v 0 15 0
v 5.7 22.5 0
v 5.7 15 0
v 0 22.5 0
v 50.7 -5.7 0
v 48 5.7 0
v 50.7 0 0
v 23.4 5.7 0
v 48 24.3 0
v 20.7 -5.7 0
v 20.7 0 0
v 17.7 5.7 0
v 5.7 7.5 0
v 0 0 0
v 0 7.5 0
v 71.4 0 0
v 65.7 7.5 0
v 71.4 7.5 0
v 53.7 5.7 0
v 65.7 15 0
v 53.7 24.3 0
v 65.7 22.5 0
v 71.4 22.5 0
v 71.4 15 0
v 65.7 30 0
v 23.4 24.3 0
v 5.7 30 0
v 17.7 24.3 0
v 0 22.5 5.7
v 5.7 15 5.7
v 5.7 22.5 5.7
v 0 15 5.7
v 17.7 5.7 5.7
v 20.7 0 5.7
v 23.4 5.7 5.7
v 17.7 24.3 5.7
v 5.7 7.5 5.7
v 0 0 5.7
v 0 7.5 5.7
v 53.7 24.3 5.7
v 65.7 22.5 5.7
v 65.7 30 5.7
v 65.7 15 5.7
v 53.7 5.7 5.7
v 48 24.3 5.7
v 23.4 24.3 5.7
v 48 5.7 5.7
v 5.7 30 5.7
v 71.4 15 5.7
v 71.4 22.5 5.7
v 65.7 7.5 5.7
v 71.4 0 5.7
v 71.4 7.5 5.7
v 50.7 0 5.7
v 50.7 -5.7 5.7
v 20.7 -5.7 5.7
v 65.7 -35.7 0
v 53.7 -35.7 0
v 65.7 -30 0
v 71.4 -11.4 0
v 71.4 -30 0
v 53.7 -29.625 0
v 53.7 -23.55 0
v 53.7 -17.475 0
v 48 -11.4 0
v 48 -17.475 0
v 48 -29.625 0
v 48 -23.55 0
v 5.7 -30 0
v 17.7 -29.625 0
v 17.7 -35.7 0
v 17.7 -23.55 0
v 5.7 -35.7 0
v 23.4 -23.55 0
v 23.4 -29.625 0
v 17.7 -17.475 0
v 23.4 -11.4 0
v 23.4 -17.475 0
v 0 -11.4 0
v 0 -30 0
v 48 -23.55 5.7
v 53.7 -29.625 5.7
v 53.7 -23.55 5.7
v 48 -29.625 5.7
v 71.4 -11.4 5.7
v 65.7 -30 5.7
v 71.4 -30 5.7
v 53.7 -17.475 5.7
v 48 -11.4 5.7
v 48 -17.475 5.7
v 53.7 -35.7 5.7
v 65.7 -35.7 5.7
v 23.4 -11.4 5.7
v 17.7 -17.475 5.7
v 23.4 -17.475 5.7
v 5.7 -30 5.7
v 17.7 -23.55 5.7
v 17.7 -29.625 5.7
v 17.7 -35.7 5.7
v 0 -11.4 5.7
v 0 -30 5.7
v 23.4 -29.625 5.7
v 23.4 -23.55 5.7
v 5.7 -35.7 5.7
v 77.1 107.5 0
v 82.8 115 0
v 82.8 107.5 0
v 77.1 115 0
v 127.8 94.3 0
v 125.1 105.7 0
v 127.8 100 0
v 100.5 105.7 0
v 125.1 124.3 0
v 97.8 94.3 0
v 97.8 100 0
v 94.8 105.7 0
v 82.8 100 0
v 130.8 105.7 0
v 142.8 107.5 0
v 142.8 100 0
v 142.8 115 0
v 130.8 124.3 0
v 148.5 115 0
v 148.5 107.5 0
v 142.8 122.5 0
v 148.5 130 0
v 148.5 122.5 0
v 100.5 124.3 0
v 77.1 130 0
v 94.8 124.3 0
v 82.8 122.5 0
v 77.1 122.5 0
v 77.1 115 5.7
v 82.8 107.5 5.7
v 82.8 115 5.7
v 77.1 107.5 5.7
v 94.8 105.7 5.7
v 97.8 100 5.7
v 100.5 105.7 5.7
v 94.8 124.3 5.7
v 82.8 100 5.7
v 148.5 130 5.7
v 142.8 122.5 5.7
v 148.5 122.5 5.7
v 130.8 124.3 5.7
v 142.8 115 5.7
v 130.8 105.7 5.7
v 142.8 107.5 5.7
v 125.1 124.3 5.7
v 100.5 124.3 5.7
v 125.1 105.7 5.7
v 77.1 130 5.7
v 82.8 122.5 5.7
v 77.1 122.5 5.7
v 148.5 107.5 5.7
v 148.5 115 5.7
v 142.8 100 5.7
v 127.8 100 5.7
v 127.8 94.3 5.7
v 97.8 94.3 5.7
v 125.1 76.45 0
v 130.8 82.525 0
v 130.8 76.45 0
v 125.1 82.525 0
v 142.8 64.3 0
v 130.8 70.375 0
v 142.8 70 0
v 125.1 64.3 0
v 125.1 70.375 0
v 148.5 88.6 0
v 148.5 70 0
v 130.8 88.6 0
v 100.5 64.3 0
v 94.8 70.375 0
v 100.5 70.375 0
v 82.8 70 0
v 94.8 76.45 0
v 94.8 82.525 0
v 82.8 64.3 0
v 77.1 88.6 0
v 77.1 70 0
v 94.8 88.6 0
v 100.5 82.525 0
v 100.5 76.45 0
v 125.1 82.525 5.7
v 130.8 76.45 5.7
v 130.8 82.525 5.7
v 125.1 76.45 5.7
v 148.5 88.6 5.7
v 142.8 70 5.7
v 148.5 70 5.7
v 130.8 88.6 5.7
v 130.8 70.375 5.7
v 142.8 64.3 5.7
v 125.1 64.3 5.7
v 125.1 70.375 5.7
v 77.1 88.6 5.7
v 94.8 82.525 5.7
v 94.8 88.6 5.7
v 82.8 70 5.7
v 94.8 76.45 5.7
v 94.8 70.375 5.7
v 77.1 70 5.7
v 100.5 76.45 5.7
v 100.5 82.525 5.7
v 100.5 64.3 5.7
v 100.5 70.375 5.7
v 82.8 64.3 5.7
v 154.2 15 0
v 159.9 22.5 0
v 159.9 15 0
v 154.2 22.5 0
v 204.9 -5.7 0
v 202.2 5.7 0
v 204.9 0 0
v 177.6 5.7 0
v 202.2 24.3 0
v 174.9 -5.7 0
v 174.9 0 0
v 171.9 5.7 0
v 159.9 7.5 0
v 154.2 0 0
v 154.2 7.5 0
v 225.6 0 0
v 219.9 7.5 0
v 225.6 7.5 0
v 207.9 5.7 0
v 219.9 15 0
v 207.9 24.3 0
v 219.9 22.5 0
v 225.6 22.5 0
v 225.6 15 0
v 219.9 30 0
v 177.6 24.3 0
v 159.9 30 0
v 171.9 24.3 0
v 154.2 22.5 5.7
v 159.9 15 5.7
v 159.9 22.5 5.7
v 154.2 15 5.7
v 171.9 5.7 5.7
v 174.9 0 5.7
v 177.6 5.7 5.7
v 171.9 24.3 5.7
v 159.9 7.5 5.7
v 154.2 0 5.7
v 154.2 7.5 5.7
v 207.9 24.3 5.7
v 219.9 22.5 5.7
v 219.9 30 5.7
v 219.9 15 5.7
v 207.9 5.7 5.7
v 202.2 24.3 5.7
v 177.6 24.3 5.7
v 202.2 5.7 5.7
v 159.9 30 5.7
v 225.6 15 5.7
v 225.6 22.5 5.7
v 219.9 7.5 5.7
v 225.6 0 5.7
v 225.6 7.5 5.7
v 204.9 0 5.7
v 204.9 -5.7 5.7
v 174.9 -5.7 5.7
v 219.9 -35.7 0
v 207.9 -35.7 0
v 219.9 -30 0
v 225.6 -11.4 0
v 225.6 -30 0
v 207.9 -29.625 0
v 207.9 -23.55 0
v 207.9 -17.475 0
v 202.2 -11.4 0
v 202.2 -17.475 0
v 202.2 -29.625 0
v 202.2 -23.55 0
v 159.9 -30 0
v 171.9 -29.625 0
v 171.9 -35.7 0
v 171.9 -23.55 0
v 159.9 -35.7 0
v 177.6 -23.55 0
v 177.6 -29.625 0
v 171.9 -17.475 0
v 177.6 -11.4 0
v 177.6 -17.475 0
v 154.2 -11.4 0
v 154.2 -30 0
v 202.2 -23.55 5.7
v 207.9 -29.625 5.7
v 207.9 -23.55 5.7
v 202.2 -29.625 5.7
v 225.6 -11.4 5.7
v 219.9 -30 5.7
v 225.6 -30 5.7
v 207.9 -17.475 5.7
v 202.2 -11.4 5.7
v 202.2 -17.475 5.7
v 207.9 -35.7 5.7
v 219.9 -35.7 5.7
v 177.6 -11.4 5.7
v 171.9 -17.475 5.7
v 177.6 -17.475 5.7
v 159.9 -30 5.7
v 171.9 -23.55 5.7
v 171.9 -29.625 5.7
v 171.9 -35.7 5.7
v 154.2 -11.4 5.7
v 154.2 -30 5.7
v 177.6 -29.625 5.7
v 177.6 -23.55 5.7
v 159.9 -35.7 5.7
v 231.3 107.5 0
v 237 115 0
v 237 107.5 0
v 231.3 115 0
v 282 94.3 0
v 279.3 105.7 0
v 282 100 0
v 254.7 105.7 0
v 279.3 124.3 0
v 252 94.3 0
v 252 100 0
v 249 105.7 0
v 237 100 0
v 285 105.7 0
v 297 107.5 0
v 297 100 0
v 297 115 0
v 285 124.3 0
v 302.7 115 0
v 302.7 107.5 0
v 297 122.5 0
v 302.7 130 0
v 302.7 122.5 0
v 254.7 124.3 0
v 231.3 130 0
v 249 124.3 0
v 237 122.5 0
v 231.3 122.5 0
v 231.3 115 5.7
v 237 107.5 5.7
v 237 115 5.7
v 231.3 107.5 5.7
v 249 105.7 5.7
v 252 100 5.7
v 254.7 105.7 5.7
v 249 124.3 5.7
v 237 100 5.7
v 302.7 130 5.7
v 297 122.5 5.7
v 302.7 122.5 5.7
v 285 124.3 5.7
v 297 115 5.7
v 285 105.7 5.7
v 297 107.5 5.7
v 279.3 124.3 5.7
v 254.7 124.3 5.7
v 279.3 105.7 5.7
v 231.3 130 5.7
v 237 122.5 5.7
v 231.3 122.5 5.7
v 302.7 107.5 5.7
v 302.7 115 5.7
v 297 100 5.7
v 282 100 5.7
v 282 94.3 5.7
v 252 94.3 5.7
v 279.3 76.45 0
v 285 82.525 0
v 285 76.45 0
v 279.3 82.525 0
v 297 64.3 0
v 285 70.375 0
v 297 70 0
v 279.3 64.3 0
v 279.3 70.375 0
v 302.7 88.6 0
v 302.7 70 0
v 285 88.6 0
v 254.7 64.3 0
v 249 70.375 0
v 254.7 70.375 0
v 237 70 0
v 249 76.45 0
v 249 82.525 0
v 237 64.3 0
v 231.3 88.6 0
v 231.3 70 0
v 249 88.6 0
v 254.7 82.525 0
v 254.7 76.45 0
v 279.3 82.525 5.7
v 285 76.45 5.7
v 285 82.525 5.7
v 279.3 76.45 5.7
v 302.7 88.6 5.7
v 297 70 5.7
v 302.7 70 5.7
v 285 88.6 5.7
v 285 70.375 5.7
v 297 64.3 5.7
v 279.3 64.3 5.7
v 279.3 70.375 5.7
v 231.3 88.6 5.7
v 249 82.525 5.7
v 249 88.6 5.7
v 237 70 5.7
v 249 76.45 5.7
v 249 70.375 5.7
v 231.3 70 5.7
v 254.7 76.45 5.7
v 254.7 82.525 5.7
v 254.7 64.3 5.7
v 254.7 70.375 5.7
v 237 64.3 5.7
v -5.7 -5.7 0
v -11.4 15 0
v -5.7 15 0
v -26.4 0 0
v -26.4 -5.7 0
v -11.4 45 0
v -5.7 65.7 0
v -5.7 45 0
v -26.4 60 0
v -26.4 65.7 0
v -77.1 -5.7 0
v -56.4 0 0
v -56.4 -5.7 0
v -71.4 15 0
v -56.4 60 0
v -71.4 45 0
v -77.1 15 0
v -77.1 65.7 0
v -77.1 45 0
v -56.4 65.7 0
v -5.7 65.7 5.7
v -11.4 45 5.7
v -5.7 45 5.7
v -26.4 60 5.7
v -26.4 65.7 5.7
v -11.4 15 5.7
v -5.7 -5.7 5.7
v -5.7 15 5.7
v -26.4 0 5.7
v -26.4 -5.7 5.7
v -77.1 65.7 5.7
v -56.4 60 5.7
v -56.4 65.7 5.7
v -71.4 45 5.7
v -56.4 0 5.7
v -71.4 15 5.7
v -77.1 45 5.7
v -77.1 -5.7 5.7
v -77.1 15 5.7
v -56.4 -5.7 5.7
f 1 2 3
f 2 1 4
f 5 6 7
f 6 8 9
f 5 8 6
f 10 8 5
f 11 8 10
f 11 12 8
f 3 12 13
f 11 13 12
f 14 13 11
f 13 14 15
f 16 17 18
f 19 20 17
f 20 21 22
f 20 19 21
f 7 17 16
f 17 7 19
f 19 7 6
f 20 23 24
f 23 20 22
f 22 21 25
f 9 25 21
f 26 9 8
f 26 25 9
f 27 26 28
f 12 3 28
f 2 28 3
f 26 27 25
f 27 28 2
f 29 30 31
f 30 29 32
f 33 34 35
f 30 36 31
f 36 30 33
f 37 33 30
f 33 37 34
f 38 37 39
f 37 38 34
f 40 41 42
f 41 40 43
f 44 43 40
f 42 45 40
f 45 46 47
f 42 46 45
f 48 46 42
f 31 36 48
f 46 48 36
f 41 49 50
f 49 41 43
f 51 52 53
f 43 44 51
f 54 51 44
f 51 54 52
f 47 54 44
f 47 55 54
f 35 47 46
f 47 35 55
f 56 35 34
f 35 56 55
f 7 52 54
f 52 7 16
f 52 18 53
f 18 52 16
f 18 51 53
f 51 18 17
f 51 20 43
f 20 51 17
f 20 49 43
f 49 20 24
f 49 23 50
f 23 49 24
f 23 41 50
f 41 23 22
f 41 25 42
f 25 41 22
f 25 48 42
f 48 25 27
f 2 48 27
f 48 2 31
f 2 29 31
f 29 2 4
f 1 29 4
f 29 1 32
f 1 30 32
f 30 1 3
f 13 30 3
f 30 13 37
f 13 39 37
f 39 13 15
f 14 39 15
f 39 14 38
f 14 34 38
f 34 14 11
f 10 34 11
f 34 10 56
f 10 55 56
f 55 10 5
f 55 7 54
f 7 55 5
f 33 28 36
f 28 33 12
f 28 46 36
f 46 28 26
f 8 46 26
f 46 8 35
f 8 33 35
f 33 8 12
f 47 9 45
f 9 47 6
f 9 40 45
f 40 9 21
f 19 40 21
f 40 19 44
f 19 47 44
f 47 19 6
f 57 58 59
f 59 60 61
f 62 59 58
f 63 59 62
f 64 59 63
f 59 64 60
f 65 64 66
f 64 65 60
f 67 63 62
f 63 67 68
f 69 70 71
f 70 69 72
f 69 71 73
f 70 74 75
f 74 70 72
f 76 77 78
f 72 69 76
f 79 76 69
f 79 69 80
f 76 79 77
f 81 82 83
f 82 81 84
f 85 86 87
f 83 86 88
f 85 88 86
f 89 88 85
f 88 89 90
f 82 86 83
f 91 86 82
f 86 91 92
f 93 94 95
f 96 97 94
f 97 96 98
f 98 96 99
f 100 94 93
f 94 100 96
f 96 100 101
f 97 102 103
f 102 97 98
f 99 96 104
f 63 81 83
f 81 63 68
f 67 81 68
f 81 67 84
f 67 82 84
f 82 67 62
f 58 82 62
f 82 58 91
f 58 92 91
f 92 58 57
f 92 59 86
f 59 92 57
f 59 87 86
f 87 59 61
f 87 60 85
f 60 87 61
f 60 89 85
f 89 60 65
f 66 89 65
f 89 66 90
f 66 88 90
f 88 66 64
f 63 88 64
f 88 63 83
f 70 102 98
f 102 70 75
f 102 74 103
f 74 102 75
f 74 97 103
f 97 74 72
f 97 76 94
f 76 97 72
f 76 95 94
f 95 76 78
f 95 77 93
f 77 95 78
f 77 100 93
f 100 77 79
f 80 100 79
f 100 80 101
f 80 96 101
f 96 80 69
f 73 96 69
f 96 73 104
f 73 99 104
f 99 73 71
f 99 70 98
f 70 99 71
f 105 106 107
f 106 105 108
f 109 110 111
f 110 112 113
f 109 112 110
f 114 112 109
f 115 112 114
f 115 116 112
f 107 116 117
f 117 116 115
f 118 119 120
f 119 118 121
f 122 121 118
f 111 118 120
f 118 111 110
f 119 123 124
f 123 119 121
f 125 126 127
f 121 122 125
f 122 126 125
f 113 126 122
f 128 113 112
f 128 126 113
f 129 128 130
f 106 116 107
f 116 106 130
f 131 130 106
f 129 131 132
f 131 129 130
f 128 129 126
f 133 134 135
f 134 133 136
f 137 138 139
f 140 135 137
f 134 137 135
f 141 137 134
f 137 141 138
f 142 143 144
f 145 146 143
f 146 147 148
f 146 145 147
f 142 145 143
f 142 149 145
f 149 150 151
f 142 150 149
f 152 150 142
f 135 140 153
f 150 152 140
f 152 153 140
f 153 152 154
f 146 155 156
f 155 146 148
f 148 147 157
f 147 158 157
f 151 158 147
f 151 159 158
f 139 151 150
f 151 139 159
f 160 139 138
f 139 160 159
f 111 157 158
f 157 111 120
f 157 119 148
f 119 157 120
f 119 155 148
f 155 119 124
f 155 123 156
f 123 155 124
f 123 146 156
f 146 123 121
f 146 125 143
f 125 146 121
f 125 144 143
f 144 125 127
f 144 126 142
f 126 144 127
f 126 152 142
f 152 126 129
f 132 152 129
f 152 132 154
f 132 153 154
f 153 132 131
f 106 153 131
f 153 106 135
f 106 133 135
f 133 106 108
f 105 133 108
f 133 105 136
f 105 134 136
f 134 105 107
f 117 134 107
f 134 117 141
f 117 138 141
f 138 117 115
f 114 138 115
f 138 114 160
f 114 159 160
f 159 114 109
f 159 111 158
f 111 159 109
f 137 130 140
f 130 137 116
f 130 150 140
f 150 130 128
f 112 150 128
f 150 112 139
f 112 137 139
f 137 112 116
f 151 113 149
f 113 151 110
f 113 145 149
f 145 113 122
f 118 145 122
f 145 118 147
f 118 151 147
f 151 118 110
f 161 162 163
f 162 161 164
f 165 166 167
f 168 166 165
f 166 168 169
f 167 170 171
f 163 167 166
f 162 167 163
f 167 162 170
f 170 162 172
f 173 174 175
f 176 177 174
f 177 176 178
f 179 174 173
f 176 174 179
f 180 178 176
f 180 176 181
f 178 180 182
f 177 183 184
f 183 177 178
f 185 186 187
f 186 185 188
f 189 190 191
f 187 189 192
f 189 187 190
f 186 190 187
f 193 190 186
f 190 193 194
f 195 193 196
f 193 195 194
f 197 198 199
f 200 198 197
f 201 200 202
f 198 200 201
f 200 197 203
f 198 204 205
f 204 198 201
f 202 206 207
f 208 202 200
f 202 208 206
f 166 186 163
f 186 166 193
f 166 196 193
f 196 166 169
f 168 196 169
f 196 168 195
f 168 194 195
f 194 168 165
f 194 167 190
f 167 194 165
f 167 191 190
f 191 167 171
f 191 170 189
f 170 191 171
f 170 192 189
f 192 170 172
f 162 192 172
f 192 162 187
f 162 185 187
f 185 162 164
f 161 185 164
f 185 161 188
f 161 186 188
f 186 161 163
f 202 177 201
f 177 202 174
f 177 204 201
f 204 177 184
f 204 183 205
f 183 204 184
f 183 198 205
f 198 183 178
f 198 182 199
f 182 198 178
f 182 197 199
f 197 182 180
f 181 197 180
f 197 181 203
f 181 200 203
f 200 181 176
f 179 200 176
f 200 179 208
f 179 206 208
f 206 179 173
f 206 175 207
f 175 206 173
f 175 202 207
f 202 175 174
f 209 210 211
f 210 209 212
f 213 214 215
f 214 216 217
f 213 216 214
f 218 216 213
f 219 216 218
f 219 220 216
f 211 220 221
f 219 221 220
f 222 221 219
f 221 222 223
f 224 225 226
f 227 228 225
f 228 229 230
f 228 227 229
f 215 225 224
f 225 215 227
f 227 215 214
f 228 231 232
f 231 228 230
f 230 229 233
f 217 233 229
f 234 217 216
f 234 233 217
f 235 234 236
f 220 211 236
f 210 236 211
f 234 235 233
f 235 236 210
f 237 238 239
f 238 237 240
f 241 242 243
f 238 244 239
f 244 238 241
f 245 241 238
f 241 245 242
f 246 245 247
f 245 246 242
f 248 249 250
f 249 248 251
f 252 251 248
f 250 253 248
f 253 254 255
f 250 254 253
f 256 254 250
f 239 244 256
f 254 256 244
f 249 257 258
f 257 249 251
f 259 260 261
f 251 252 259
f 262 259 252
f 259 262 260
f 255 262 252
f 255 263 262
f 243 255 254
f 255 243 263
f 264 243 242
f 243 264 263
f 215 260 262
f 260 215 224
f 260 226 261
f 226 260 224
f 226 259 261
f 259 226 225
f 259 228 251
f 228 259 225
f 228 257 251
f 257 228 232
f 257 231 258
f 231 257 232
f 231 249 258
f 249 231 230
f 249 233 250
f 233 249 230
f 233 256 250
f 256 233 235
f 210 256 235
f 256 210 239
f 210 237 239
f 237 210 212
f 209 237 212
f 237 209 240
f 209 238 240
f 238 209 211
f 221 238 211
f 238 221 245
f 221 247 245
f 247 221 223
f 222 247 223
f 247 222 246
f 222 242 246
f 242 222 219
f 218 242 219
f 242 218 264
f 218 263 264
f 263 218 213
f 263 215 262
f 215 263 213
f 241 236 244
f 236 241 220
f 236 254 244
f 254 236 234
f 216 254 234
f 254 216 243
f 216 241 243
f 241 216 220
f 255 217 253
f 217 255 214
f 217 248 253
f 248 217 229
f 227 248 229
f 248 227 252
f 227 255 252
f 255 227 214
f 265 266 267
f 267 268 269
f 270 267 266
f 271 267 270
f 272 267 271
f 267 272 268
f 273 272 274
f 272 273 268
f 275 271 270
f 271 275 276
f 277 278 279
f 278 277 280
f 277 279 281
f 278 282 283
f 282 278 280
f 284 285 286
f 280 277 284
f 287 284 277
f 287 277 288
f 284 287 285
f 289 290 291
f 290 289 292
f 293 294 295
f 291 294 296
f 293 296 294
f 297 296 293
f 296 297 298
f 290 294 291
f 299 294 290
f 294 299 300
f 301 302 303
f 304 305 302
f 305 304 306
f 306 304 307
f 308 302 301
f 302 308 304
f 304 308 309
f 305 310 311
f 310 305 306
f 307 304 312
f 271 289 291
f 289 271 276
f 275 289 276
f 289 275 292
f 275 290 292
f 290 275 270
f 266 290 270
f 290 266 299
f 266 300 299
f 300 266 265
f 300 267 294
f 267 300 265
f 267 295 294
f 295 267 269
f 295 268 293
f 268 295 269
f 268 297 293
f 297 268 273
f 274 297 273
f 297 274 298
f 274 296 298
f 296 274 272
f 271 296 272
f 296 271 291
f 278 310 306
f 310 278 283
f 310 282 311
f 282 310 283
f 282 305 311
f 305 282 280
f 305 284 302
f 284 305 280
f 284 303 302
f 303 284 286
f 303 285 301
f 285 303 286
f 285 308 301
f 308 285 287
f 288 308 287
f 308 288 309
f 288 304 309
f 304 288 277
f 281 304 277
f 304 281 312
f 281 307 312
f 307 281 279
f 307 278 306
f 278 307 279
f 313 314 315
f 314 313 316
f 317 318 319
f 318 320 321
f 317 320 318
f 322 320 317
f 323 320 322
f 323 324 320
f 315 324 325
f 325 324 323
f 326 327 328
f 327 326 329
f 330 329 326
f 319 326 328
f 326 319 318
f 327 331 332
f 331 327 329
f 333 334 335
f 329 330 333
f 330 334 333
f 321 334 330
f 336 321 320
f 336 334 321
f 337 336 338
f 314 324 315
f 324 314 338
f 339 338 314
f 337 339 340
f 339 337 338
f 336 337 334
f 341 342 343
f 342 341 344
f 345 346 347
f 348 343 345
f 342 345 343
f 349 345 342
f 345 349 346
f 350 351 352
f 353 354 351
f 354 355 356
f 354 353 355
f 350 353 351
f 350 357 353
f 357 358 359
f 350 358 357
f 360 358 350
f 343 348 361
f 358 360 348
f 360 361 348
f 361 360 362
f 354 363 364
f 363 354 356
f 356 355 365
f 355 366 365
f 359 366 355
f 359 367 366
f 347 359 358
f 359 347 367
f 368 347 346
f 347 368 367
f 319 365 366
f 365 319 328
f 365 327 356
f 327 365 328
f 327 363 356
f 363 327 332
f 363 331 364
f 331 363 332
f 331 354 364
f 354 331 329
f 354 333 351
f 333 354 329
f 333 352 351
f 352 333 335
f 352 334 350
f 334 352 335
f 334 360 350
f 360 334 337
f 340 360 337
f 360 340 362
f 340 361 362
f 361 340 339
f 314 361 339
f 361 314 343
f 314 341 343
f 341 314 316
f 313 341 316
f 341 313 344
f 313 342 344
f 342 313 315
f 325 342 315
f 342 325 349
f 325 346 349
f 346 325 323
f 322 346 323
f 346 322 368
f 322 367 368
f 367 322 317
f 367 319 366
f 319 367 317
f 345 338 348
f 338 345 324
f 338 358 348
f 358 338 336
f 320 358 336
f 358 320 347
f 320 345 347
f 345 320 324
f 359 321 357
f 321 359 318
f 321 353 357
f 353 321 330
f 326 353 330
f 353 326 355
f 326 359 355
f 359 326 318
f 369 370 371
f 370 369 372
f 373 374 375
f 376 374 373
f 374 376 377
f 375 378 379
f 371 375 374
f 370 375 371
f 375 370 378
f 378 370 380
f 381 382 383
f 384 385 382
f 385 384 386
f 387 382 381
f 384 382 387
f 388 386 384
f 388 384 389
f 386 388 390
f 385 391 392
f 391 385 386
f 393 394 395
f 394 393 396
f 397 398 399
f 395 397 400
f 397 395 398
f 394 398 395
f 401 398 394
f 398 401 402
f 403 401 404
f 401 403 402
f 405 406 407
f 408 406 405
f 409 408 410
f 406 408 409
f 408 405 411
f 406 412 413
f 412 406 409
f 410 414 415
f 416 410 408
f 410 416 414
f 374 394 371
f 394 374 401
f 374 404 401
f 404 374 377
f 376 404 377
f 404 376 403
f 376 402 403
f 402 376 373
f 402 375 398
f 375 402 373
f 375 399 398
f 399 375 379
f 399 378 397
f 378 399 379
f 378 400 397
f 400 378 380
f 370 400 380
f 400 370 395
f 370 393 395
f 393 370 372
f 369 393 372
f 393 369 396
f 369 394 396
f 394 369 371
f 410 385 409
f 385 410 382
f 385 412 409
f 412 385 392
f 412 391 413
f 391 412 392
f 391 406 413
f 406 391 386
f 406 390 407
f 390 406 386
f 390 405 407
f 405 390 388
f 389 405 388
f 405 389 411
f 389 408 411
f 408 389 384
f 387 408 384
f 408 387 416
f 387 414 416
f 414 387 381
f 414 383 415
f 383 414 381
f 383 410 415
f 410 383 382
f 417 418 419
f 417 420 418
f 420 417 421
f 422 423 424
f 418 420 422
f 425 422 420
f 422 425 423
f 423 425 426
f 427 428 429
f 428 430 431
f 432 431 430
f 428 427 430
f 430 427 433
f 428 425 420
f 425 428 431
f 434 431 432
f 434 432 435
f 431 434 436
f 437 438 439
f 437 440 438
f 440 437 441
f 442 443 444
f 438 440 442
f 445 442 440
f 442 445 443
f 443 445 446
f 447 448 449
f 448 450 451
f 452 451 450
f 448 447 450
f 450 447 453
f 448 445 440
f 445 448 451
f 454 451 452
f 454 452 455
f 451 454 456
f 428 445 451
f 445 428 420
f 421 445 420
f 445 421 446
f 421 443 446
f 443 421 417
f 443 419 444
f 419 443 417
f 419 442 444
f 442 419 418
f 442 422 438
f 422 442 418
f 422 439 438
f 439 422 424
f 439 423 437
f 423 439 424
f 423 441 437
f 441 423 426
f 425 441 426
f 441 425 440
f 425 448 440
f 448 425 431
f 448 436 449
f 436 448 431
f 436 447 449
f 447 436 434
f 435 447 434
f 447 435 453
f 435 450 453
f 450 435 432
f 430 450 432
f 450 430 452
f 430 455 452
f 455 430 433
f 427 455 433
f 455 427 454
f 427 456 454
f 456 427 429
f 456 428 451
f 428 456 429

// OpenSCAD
T = 5.7; // thickness
TA = 3.0;
kerf = 0.2;

s440 = 2.845/2;
middle = 100;

box_s = 60;
box_inset = 12;
box_top_inset = T;
box_h = 30;

function tabSize(n_tabs, length) = length/n_tabs/2;

module tabs(n_tabs, length, vert=false, secondary=false) {
    tab_s = tabSize(n_tabs, length);

    for (i=[0:n_tabs-1]) {
        tab_y = tab_s*i*2;
        tab_offset = secondary ? tab_s : 0;
        if (vert) {
            translate([0, tab_y+tab_offset])
            square([T, tab_s]);
        } else {
            translate([tab_y+tab_offset, 0])
            square([tab_s, T]);
        }
    }
}

module outer_tab_holes() {
    translate([T+box_inset, T])
    square([T, box_h-box_top_inset-T]);
    translate([box_s-box_inset, T])
    square([T, box_h-box_top_inset-T]);
}

module tabbed_face(top_tabs) {
    union() {
        translate([T, 0])
        square([box_s, box_h]);

        translate([0, 0])
        tabs(2, box_h, vert=true, secondary=top_tabs);
        translate([box_s+T, 0])
        tabs(2, box_h, vert=true, secondary=top_tabs);

        translate([T+box_s/4, -T])
        tabs(1, box_s);
    }
}

module outer_tabbed_face(top_tabs) {
    linear_extrude(height=T)
        difference() {
            tabbed_face(top_tabs);
            outer_tab_holes();
        }
}

module single_tabbed_face() {
    union() {
        translate([T, 0])
        square([box_s, box_h-box_top_inset]);
        translate([0, T])
        square([T, box_h-box_top_inset-T]);
        translate([box_s+T, T])
        square([T, box_h-box_top_inset-T]);
    }
}

module inner_tabbed_face(top_tabs) {
    linear_extrude(height=T)
        difference() {
            single_tabbed_face();
            slice_h = (box_h-box_top_inset)/2;
            /* if (top_tabs) { */
            /*     translate([T + box_inset, slice_h]) */
            /*     square([T, slice_h]); */
            /*     translate([box_s - box_inset, slice_h]) */
            /*     square([T, slice_h]); */
            /* } else { */
            /*     translate([T + box_inset, 0]) */
            /*     square([T, slice_h]); */
            /*     translate([box_s - box_inset, 0]) */
            /*     square([T, slice_h]); */
            /* } */
            translate([box_inset+T, 0, 0])
            tabs(2, box_h-box_top_inset, vert=true, secondary=top_tabs);
            translate([box_s-box_inset, 0, 0])
            tabs(2, box_h-box_top_inset, vert=true, secondary=top_tabs);
            translate([box_inset+2*T, 0, 0])
            square([(box_s-box_inset*2)-2*T, box_h]);
        }
}

module bottom() {
    linear_extrude(height=T) {
        union() {
            square([box_s, box_s]);

            square_s = box_s/4+T;

            translate([-T, -T])
            square(square_s);

            translate([box_s-square_s+T, -T])
            square(square_s);

            translate([box_s-square_s+T, box_s-square_s+T])
            square(square_s);

            translate([-T, box_s-square_s+T])
            square(square_s);
        }
    }
}

module top() {
    //linear_extrude(height=TA)
        difference() {
            square([box_s, box_s]);
            translate([box_s/2, box_s/2]) circle(r=7/2);
        }
}

// Layed out

for (f = [0:3]) {
    translate([f*(box_s+T*3), (f%2*100)]) {
        outer_tabbed_face(f%2);
        translate([0, -box_h-T])
        inner_tabbed_face(f%2);
    }
}

translate([-box_s-2*T, 0])
bottom();

translate([-box_s-2*T, -box_s-3*T])
*top();

// In 3d

off_yellow = [0.85, 0.75, 0, 1];//0.5];
off_blue = [0, 0.75, 0.85, 1];//0.5];
off_green = [0, 0.85, 0.55, 1];//0.5];

*rotate([90, 0, 0])
translate([0,0,0]) {

    color(off_yellow)
    translate([0, 0, 0])
    outer_tabbed_face(0);

    color(off_yellow)
    translate([0, 0, box_s+T])
    outer_tabbed_face(0);

    color(off_blue)
    translate([T, 0, 0])
    rotate([0, 270, 0])
    outer_tabbed_face(1);

    color(off_blue)
    translate([box_s+2*T, 0, 0])
    rotate([0, 270, 0])
    outer_tabbed_face(1);

    color(off_green)
    translate([T, 0, T])
    rotate([90, 0, 0])
    bottom();

    translate([box_inset+2*T, 0])
    rotate([0, 270, 0])
    inner_tabbed_face();

    translate([box_s-box_inset+T, 0])
    rotate([0, 270, 0])
    inner_tabbed_face();

    color(off_yellow)
    translate([0, 0, box_inset+T])
    inner_tabbed_face(1);

    color(off_yellow)
    translate([0, 0, box_s-box_inset])
    inner_tabbed_face(1);

}
